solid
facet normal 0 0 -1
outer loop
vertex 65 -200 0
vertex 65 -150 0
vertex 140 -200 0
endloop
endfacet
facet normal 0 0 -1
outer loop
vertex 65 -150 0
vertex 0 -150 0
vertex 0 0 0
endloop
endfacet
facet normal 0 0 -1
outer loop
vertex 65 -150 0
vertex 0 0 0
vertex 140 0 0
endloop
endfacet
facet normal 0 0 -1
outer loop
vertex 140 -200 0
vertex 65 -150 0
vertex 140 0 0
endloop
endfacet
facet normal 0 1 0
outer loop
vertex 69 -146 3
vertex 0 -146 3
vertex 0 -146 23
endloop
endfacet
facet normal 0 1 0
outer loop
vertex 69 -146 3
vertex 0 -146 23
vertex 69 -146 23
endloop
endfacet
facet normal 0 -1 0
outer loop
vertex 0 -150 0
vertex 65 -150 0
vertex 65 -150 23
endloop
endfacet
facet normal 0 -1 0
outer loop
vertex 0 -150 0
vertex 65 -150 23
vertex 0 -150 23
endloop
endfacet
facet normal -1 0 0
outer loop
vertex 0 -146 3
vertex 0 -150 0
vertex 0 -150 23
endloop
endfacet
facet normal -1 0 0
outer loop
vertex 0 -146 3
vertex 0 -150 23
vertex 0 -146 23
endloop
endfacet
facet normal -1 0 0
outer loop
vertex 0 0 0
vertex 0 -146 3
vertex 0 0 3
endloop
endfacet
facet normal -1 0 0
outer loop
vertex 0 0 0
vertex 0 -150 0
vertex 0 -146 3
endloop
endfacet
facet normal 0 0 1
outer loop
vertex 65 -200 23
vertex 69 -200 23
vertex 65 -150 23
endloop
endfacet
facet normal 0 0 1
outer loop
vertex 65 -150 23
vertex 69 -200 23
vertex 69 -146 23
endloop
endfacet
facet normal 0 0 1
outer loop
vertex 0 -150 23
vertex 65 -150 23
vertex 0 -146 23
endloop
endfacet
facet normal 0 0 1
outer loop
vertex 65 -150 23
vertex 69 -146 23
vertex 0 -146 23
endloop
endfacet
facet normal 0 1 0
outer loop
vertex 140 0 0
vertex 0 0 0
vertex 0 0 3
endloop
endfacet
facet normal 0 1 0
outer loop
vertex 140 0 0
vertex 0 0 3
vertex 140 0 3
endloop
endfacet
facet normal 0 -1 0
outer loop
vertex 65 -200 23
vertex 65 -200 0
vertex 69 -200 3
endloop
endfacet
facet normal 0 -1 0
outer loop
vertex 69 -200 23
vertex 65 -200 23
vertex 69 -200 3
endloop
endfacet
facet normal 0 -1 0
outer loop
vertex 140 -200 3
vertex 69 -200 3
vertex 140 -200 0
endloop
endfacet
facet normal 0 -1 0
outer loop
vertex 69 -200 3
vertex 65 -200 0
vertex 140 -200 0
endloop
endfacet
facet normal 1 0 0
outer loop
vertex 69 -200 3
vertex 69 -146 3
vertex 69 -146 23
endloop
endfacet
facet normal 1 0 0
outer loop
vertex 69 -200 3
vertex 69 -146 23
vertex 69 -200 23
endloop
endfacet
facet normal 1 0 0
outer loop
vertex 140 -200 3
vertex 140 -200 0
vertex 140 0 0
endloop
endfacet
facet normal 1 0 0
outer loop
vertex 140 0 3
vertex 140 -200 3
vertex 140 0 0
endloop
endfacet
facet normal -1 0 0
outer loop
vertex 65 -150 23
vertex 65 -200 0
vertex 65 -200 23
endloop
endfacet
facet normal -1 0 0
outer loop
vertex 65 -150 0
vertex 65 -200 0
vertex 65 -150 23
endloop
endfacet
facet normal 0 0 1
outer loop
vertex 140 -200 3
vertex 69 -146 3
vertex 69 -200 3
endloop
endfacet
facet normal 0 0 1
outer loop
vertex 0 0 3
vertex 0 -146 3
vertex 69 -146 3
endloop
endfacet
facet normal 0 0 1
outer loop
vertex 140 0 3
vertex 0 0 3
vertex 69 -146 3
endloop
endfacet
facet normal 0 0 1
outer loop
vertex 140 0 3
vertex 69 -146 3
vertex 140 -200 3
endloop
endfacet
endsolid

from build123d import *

# Parameters (mm, degrees)
SKETCH_1_W          = 140
SKETCH_1_H          = 200
EXTRUDE_1_DEPTH     = 3
SKETCH_2_W          = 65
SKETCH_2_H          = 50
CUT_EXTRUDE_1_DEPTH = 10
SKETCH_3_W          = 4
SKETCH_3_H          = 50
EXTRUDE_2_DEPTH     = 23


with BuildPart() as part:
    # 草图1 → 凸台-拉伸1 (new body)
    with BuildSketch(Plane.XY):
        with Locations((70, -100)):
            Rectangle(SKETCH_1_W, SKETCH_1_H)
    extrude(amount=EXTRUDE_1_DEPTH)

    # 草图2 → 切除-拉伸1 (cut)
    with BuildSketch(Plane(origin=(0, 0, 0), x_dir=(-1, 0, 0), z_dir=(0, 0, -1))):
        with Locations((-32.5, -175)):
            Rectangle(SKETCH_2_W, SKETCH_2_H)
    extrude(amount=-CUT_EXTRUDE_1_DEPTH, mode=Mode.SUBTRACT)

    # 草图3 → 凸台-拉伸2 (add)
    with BuildSketch(Plane(origin=(0, 0, 0), x_dir=(-1, 0, 0), z_dir=(0, 0, -1))):
        with Locations((-67, -175)):
            Rectangle(SKETCH_3_W, SKETCH_3_H)
        Polygon((-65, -150), (0, -150), (0, -146), (-69, -146), (-69, -150), align=None)
    extrude(amount=-EXTRUDE_2_DEPTH)


solid = part.part
